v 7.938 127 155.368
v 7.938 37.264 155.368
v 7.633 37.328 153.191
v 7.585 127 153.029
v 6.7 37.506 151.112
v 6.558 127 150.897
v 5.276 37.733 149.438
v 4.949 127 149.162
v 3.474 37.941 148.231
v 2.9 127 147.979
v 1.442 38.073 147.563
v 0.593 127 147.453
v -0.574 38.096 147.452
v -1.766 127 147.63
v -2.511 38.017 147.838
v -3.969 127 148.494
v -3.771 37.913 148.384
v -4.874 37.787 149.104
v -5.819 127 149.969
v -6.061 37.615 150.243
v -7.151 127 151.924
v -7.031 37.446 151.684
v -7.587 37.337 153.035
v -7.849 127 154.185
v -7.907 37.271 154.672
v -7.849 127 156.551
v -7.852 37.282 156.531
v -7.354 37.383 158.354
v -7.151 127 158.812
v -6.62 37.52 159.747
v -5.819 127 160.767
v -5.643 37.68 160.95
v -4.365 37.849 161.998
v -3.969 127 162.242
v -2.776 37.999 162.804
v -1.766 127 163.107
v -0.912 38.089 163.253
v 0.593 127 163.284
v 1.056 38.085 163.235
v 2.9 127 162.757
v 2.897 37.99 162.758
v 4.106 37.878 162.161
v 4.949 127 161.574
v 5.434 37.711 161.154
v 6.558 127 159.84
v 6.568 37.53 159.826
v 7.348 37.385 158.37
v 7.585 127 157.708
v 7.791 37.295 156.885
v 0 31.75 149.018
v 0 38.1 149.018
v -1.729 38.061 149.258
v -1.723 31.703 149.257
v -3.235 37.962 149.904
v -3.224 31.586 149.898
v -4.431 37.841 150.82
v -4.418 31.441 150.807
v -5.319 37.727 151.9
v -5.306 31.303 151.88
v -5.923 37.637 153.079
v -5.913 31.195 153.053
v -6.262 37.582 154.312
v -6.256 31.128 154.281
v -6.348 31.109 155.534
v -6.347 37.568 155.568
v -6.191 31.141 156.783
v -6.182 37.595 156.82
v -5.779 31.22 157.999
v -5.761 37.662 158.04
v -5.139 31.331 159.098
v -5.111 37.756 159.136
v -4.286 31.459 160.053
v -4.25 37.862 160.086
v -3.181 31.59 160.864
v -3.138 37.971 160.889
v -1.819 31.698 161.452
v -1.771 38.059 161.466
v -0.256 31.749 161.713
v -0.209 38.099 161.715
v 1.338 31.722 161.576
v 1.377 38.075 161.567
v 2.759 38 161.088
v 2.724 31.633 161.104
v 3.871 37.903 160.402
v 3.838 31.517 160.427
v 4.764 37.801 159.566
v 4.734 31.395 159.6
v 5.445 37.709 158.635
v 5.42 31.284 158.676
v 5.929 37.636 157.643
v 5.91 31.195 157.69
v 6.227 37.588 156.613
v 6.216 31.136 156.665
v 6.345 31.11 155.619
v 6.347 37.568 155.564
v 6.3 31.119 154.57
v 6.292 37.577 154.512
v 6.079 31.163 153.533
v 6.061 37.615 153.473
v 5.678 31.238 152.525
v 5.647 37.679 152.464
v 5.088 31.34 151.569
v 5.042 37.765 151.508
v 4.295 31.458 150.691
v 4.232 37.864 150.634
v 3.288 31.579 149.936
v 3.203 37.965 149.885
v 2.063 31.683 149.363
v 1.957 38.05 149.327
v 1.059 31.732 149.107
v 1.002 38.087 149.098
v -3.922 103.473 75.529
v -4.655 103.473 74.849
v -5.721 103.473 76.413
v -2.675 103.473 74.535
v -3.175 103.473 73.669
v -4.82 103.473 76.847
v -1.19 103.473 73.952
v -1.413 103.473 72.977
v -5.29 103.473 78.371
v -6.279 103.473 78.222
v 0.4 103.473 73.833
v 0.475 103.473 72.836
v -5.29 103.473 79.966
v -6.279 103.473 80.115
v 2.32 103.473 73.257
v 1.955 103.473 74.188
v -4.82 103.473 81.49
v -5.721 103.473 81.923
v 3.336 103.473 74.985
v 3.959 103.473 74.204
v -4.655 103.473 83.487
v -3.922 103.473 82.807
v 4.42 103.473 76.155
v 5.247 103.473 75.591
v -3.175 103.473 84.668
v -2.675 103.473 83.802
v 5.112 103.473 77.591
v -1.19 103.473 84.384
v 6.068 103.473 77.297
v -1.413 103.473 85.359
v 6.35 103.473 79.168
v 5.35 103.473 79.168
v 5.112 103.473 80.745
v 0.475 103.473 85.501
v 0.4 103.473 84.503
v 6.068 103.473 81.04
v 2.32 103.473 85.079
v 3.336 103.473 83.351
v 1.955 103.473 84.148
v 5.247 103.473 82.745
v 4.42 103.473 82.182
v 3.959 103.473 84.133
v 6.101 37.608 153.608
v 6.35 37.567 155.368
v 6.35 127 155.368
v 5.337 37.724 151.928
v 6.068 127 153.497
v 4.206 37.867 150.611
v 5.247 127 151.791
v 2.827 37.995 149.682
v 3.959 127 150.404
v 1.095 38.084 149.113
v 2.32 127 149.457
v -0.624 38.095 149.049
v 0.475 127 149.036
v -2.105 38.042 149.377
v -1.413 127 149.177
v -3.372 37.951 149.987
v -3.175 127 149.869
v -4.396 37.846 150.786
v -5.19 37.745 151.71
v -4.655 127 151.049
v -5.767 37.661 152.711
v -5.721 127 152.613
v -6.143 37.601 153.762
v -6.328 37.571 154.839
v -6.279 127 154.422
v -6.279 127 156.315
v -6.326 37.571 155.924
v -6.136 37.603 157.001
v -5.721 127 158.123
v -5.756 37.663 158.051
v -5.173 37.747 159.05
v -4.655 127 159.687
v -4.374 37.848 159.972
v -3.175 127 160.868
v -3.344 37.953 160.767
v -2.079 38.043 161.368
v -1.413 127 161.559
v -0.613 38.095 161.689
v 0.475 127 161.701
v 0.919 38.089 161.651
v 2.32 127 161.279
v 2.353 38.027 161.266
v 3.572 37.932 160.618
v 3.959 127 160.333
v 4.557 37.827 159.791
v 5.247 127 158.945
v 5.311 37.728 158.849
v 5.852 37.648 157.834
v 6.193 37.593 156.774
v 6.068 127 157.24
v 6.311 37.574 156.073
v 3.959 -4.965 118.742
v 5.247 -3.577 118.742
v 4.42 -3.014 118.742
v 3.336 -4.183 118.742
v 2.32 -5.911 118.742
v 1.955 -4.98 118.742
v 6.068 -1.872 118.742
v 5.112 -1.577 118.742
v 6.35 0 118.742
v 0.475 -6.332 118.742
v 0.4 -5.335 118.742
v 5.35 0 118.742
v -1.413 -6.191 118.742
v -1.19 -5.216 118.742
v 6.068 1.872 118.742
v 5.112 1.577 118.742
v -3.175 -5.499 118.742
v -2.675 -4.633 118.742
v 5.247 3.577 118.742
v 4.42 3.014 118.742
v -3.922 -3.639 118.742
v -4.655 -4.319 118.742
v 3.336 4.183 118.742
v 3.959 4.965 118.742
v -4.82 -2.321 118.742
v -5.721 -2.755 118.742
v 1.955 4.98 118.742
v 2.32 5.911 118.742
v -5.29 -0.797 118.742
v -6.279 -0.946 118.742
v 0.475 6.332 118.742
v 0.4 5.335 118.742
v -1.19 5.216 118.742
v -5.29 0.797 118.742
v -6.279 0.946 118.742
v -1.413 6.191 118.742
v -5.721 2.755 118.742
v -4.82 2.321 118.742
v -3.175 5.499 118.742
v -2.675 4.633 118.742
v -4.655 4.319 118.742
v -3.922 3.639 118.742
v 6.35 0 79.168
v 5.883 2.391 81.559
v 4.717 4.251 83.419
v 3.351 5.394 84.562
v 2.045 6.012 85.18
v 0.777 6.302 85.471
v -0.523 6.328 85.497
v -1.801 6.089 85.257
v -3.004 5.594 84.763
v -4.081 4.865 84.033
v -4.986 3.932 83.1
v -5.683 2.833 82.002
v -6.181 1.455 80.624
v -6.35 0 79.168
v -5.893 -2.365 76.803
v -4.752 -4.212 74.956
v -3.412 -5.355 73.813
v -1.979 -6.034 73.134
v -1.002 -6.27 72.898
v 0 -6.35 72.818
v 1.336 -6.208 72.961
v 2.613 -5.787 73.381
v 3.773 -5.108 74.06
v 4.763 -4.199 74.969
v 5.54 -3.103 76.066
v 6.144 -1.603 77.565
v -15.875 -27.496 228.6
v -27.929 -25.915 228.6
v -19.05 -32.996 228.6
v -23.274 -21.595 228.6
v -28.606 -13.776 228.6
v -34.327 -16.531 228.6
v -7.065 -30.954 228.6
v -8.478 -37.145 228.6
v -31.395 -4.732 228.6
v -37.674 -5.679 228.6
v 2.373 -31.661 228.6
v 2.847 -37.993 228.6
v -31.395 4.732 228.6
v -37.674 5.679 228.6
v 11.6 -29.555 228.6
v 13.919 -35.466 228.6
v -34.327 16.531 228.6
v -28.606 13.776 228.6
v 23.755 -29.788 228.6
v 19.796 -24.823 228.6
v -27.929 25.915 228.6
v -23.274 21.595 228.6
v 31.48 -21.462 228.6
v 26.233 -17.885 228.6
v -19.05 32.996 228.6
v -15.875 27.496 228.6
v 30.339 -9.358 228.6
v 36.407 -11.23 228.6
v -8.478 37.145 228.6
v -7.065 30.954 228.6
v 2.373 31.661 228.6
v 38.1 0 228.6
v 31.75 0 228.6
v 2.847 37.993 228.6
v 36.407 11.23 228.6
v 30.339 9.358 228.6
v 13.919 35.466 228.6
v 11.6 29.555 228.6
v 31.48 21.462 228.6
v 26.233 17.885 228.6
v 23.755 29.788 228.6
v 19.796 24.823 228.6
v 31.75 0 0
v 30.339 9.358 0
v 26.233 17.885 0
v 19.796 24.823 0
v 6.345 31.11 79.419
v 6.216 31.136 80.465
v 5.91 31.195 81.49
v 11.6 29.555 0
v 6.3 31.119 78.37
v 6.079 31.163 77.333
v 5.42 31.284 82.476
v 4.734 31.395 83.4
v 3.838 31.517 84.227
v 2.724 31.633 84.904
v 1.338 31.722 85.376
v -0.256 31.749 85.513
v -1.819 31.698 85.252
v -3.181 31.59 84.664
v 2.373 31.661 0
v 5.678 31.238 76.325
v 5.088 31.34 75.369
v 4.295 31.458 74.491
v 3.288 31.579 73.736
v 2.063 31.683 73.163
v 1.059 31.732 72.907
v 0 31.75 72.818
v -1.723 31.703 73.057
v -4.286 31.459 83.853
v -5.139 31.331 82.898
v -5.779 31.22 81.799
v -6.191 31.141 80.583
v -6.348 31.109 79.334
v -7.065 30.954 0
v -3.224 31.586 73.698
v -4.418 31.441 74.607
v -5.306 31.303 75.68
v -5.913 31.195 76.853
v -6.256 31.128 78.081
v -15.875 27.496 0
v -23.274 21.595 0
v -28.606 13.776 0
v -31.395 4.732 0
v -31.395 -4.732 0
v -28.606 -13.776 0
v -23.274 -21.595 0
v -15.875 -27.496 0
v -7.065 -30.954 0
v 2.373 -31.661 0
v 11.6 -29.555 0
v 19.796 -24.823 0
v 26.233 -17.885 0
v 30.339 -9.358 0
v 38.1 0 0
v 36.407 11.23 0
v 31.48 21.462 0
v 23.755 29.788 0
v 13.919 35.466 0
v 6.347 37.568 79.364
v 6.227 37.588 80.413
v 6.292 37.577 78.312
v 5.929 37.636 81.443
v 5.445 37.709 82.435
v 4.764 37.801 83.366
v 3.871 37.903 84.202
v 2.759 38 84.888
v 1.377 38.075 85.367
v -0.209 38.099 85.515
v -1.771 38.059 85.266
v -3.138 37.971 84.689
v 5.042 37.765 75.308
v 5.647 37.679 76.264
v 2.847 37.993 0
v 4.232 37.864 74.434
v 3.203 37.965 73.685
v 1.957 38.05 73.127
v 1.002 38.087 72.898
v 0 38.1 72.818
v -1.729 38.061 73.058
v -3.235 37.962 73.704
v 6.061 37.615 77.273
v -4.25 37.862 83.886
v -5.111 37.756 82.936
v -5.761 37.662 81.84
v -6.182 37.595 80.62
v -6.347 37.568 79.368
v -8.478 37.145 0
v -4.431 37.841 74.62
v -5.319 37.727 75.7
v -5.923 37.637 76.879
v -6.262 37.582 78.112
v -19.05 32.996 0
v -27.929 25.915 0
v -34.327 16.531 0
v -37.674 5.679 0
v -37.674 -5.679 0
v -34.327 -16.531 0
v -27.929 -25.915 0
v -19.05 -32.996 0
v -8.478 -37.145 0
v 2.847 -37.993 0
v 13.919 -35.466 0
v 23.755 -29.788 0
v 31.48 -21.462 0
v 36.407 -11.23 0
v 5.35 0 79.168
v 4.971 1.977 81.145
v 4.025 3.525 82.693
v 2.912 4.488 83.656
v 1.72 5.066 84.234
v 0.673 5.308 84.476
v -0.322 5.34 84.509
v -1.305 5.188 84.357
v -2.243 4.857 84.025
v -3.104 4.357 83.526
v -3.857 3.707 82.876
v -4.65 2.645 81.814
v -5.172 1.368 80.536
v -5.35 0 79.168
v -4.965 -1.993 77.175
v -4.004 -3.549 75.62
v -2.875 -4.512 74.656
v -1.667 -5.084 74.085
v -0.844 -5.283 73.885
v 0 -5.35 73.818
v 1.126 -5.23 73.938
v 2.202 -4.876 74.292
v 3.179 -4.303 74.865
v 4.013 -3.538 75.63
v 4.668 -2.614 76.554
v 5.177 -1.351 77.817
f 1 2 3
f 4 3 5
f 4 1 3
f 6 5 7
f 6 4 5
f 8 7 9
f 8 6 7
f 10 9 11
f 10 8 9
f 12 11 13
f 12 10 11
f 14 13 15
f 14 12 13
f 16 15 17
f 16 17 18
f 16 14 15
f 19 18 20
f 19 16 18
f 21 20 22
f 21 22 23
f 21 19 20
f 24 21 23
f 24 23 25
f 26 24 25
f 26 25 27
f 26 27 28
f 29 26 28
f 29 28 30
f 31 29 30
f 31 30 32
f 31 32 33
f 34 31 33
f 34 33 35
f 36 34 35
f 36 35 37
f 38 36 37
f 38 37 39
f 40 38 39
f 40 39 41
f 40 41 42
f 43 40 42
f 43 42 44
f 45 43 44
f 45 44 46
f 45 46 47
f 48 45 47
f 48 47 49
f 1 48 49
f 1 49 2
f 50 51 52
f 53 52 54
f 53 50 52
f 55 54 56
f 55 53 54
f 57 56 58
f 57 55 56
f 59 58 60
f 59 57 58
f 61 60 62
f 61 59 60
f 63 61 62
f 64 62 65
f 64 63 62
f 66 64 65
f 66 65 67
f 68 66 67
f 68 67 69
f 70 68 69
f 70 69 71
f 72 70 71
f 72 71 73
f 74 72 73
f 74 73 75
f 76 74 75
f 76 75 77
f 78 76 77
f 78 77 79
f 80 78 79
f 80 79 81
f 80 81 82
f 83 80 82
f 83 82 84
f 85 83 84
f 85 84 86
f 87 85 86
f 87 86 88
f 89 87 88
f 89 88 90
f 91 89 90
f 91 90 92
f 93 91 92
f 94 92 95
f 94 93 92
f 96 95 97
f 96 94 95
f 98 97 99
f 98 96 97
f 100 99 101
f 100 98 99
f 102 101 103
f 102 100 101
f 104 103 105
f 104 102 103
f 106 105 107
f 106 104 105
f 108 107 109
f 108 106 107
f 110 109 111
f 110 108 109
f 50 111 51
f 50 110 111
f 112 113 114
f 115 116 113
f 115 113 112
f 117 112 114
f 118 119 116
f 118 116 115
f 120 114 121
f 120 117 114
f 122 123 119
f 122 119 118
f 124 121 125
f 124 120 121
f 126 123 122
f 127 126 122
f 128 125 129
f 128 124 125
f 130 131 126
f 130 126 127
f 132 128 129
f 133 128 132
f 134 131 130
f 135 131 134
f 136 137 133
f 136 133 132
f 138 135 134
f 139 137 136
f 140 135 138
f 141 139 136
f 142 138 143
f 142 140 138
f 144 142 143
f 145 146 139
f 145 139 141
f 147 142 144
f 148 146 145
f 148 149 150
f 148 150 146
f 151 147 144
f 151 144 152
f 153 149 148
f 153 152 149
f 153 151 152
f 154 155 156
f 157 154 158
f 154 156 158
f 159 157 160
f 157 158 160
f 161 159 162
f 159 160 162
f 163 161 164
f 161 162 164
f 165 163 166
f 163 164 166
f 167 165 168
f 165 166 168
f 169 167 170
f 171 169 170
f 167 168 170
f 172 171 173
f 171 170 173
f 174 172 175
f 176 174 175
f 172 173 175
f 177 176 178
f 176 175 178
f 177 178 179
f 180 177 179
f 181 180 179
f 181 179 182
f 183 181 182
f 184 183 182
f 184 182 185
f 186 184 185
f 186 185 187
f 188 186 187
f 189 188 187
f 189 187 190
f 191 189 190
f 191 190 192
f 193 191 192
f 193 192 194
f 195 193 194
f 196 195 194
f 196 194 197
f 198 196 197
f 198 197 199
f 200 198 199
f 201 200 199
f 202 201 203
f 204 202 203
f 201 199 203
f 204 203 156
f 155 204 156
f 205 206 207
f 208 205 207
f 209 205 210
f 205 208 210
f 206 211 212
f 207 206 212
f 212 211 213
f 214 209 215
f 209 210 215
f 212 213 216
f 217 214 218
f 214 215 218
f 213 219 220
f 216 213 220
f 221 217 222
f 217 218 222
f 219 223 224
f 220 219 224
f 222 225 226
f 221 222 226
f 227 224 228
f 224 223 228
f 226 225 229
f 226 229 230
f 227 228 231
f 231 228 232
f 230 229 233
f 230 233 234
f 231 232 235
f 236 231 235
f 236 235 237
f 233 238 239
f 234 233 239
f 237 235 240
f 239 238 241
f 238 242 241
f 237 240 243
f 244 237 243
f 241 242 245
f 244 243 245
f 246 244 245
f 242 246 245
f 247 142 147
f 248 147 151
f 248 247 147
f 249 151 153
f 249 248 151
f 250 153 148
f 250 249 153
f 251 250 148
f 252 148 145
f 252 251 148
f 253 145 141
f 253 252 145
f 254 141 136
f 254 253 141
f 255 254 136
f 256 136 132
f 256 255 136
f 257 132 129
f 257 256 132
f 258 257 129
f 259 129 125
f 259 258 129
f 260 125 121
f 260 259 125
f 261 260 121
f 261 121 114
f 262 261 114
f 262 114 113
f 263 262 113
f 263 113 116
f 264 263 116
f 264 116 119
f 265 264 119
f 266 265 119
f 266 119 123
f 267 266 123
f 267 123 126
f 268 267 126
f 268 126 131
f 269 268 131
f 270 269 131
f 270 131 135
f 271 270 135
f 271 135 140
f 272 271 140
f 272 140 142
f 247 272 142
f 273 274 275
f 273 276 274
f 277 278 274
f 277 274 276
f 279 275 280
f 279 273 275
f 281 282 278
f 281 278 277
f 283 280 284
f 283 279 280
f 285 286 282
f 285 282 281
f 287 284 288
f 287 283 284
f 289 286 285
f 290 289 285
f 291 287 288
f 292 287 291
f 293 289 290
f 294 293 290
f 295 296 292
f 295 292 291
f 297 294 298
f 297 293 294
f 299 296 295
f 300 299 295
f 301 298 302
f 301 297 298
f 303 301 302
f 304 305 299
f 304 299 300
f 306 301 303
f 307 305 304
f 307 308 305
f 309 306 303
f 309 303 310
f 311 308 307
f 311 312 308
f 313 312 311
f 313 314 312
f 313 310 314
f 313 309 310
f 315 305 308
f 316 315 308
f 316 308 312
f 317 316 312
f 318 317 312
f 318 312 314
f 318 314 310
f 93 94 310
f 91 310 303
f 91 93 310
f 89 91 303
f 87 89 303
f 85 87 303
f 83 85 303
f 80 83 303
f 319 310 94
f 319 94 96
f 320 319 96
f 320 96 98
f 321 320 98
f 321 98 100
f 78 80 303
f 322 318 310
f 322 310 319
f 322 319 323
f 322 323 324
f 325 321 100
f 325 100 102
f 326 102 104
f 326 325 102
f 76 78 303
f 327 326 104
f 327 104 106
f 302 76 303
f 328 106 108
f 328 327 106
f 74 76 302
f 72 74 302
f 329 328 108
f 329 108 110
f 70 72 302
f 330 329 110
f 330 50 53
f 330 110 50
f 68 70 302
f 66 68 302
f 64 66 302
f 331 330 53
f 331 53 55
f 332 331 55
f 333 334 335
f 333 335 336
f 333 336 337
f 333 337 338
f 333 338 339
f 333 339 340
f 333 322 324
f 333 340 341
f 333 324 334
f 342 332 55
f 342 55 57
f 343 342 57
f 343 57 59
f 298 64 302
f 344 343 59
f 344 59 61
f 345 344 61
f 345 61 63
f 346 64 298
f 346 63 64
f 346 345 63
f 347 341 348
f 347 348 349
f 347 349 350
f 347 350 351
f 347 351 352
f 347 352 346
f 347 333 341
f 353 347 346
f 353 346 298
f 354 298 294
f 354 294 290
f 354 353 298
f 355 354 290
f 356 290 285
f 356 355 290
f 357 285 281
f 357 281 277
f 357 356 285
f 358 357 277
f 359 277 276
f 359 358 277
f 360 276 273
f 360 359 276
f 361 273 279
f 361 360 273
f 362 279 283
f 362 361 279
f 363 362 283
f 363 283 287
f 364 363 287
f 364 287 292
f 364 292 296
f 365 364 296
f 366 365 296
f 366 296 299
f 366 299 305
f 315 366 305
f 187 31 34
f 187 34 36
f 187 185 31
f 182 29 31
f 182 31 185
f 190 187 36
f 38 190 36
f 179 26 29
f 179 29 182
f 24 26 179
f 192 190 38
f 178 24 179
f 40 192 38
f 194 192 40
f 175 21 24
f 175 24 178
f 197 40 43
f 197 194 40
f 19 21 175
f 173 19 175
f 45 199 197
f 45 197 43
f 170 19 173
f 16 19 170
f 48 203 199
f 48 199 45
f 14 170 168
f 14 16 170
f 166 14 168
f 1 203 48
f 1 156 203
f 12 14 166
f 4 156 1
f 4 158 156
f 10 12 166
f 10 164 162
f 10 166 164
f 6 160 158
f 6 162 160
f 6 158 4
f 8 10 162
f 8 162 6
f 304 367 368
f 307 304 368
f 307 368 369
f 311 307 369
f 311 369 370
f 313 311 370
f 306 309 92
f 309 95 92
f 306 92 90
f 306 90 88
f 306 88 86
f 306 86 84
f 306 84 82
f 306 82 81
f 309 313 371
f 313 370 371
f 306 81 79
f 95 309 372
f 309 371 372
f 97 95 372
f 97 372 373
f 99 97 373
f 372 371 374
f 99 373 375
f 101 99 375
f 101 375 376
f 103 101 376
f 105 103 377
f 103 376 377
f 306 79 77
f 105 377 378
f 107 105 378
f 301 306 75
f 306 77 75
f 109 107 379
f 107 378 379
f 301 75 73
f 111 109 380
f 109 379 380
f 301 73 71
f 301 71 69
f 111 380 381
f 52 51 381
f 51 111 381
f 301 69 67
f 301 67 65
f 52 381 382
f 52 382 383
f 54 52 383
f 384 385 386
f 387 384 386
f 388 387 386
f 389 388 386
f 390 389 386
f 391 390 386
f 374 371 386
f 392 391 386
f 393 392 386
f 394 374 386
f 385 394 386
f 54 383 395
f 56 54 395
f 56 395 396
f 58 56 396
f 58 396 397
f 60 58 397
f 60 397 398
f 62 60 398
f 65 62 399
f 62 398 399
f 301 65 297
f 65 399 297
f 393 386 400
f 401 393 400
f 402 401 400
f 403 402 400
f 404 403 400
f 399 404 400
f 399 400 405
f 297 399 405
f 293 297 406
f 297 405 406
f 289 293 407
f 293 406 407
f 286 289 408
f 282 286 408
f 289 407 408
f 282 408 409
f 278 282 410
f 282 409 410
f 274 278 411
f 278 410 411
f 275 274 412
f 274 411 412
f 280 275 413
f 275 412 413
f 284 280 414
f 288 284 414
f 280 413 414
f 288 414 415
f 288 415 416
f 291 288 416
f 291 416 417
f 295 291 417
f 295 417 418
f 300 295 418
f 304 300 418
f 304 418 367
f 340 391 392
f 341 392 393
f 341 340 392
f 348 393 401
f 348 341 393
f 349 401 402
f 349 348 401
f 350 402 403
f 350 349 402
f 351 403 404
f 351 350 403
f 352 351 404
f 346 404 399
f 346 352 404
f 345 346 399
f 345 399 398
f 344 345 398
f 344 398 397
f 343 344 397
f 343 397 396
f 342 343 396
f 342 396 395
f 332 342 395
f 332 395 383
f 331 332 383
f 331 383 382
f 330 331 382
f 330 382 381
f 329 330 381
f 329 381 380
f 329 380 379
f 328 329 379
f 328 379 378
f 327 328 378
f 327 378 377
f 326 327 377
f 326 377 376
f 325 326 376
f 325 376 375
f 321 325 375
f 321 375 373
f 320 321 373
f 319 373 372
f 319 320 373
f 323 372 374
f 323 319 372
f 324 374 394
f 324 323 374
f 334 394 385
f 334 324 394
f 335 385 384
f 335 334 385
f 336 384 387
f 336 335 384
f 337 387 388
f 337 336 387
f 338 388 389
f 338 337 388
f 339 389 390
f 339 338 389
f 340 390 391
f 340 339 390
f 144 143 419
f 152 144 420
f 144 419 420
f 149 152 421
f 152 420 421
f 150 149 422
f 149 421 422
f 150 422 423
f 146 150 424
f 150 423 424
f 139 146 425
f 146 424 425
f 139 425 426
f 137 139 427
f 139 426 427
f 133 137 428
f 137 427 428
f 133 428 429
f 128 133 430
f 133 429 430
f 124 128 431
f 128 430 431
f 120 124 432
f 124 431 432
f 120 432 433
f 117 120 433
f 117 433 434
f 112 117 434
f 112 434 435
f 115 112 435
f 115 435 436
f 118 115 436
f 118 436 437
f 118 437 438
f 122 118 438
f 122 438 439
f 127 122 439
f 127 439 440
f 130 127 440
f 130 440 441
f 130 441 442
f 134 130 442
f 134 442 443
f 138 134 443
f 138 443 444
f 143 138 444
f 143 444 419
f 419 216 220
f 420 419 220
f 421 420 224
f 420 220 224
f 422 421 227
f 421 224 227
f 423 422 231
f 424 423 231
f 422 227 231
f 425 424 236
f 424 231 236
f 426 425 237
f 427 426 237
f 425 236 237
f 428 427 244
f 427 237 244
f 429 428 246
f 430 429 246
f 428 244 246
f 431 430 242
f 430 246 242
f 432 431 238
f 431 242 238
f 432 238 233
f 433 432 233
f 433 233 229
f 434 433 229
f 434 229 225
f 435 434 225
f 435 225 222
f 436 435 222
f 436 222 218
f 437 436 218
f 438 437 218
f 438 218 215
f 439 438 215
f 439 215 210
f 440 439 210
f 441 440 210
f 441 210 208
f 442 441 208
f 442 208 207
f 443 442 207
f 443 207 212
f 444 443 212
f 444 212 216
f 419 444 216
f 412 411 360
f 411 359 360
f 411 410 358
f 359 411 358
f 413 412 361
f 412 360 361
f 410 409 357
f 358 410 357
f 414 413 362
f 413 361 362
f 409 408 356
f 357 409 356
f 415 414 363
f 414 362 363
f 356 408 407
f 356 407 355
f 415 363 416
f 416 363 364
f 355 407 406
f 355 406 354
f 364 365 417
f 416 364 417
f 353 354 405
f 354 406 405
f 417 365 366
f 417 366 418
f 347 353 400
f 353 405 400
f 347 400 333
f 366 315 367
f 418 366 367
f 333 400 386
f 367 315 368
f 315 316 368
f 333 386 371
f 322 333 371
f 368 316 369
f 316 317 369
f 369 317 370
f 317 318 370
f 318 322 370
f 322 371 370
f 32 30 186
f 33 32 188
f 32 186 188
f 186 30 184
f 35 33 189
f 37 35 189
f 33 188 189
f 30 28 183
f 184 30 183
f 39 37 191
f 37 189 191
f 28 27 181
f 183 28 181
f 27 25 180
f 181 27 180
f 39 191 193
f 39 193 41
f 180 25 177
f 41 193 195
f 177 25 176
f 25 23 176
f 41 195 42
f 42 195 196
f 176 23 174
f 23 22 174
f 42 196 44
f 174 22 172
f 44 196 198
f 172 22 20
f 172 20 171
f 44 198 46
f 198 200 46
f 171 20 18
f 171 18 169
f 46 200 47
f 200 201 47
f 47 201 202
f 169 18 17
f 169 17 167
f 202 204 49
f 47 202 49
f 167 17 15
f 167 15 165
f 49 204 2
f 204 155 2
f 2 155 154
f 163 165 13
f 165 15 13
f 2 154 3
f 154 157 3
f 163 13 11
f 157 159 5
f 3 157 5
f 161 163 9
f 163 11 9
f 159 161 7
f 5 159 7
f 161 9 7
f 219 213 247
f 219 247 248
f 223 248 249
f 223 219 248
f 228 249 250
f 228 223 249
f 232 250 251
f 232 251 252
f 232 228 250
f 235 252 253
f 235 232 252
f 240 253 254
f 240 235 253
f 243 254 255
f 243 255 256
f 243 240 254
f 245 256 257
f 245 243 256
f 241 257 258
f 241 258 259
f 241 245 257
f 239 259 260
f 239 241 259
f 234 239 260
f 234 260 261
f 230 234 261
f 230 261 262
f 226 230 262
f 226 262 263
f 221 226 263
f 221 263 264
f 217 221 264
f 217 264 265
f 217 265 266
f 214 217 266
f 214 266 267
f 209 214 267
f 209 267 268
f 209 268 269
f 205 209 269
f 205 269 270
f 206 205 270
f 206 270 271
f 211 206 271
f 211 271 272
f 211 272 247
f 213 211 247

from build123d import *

# Parameters (mm, degrees)
SKETCH3_R                = 38.1
SKETCH3_R_2              = 31.75
BOSS_EXTRUDE2_DEPTH      = 228.6
SKETCH5_R                = 6.35
CUT_EXTRUDE3_DEPTH       = 235.864173513
EXTRUDE_THIN1_REACH      = 363.864
EXTRUDE_THIN1_END_RADIUS = 38.1
EXTRUDE_THIN1_START      = 127
SKETCH5_3_R              = 7.9375
SKETCH5_3_R_2            = 6.35
SKETCH8_R                = 6.35
SKETCH8_R_2              = 5.35


with BuildPart() as part:
    # Sketch3 → Boss-Extrude2 (new body)
    with BuildSketch(Plane.XY):
        Circle(SKETCH3_R)
        Circle(SKETCH3_R_2, mode=Mode.SUBTRACT)
    extrude(amount=BOSS_EXTRUDE2_DEPTH)

    # Sketch5 → Cut-Extrude3 (cut, through all)
    with BuildSketch(Plane(origin=(0, 0, 0), x_dir=(1, 0, 0), z_dir=(0, 1, 0))):
        with Locations(Location((0, -79.168272232, 0), (0, 0, 90))):
            Circle(SKETCH5_R)
        with Locations(Location((0, -155.368272232, 0), (0, 0, 90))):
            Circle(SKETCH5_R)
    extrude(amount=CUT_EXTRUDE3_DEPTH, mode=Mode.SUBTRACT)


with BuildPart() as body_2:
    # Extrude-Thin1: up to this cylinder (the profile starts outside it)
    extrude_thin1_end = Plane(origin=(0, 0, 155.368272), z_dir=(0, 0, -1)) * Cylinder(EXTRUDE_THIN1_END_RADIUS, 804.928, mode=Mode.PRIVATE)
    # Sketch5<3> → Extrude-Thin1 (new, up to the surface)
    with BuildSketch(Plane(origin=(0, 0, 0), x_dir=(1, 0, 0), z_dir=(0, 1, 0)).offset(EXTRUDE_THIN1_START), mode=Mode.PRIVATE) as extrude_thin1_sk1:
        with Locations((0, -155.368272232)):
            Circle(SKETCH5_3_R)
        with Locations((0, -155.368272232)):
            Circle(SKETCH5_3_R_2, mode=Mode.SUBTRACT)
    extrude_thin1_tool1 = extrude(extrude_thin1_sk1.sketch, amount=-EXTRUDE_THIN1_REACH, mode=Mode.PRIVATE) - extrude_thin1_end
    add(extrude_thin1_tool1.solids().sort_by_distance((-7.712994, 127, 155.368272))[0])


with BuildPart() as body_3:
    # Sweep-Thin1: sweep along a path in Sketch7
    with BuildLine(Plane(origin=(0, 0, 0), x_dir=(0, 0, -1), z_dir=(1, 0, 0))) as sweep_thin1_path:
        Line((-79.168272232, 103.473233019), (-79.168272232, 0))
        Line((-79.168272232, 0), (-118.741869737, 0))
    # Sketch8 → Sweep-Thin1 (sweep)
    with BuildSketch(Plane(origin=(0, 103.473233019, 79.168272232), x_dir=(1, 0, 0), z_dir=(0, 1, 0))):
        Circle(SKETCH8_R)
        Circle(SKETCH8_R_2, mode=Mode.SUBTRACT)
    sweep(path=sweep_thin1_path.line, transition=Transition.RIGHT)


solid = Compound([part.part, body_2.part, body_3.part])
